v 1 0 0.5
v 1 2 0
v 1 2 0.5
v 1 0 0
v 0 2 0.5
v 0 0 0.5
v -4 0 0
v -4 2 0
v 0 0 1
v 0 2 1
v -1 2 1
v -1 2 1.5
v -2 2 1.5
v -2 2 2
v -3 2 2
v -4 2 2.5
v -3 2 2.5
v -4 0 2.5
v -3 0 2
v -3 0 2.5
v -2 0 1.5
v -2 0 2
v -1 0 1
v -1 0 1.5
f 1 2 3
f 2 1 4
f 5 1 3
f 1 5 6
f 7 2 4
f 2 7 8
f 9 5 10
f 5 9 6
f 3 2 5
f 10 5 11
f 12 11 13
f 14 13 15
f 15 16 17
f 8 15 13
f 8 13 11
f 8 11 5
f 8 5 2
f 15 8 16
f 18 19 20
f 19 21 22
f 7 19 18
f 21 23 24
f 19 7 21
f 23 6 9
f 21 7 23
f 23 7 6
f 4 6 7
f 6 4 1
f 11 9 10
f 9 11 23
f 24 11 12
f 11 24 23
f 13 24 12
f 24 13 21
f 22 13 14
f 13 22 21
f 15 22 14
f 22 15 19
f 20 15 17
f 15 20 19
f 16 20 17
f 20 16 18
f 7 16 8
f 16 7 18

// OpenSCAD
color("#cdaa7d"){

translate([0,-0,0])
cube([1,2,0.5]);

translate([-1,-0,0])
cube([1,2,1]);

translate([-2,-0,0])
cube([1,2,1.5]);

translate([-3,-0,0])
cube([1,2,2]);

translate([-4,-0,0])
cube([1,2,2.5]);
}
